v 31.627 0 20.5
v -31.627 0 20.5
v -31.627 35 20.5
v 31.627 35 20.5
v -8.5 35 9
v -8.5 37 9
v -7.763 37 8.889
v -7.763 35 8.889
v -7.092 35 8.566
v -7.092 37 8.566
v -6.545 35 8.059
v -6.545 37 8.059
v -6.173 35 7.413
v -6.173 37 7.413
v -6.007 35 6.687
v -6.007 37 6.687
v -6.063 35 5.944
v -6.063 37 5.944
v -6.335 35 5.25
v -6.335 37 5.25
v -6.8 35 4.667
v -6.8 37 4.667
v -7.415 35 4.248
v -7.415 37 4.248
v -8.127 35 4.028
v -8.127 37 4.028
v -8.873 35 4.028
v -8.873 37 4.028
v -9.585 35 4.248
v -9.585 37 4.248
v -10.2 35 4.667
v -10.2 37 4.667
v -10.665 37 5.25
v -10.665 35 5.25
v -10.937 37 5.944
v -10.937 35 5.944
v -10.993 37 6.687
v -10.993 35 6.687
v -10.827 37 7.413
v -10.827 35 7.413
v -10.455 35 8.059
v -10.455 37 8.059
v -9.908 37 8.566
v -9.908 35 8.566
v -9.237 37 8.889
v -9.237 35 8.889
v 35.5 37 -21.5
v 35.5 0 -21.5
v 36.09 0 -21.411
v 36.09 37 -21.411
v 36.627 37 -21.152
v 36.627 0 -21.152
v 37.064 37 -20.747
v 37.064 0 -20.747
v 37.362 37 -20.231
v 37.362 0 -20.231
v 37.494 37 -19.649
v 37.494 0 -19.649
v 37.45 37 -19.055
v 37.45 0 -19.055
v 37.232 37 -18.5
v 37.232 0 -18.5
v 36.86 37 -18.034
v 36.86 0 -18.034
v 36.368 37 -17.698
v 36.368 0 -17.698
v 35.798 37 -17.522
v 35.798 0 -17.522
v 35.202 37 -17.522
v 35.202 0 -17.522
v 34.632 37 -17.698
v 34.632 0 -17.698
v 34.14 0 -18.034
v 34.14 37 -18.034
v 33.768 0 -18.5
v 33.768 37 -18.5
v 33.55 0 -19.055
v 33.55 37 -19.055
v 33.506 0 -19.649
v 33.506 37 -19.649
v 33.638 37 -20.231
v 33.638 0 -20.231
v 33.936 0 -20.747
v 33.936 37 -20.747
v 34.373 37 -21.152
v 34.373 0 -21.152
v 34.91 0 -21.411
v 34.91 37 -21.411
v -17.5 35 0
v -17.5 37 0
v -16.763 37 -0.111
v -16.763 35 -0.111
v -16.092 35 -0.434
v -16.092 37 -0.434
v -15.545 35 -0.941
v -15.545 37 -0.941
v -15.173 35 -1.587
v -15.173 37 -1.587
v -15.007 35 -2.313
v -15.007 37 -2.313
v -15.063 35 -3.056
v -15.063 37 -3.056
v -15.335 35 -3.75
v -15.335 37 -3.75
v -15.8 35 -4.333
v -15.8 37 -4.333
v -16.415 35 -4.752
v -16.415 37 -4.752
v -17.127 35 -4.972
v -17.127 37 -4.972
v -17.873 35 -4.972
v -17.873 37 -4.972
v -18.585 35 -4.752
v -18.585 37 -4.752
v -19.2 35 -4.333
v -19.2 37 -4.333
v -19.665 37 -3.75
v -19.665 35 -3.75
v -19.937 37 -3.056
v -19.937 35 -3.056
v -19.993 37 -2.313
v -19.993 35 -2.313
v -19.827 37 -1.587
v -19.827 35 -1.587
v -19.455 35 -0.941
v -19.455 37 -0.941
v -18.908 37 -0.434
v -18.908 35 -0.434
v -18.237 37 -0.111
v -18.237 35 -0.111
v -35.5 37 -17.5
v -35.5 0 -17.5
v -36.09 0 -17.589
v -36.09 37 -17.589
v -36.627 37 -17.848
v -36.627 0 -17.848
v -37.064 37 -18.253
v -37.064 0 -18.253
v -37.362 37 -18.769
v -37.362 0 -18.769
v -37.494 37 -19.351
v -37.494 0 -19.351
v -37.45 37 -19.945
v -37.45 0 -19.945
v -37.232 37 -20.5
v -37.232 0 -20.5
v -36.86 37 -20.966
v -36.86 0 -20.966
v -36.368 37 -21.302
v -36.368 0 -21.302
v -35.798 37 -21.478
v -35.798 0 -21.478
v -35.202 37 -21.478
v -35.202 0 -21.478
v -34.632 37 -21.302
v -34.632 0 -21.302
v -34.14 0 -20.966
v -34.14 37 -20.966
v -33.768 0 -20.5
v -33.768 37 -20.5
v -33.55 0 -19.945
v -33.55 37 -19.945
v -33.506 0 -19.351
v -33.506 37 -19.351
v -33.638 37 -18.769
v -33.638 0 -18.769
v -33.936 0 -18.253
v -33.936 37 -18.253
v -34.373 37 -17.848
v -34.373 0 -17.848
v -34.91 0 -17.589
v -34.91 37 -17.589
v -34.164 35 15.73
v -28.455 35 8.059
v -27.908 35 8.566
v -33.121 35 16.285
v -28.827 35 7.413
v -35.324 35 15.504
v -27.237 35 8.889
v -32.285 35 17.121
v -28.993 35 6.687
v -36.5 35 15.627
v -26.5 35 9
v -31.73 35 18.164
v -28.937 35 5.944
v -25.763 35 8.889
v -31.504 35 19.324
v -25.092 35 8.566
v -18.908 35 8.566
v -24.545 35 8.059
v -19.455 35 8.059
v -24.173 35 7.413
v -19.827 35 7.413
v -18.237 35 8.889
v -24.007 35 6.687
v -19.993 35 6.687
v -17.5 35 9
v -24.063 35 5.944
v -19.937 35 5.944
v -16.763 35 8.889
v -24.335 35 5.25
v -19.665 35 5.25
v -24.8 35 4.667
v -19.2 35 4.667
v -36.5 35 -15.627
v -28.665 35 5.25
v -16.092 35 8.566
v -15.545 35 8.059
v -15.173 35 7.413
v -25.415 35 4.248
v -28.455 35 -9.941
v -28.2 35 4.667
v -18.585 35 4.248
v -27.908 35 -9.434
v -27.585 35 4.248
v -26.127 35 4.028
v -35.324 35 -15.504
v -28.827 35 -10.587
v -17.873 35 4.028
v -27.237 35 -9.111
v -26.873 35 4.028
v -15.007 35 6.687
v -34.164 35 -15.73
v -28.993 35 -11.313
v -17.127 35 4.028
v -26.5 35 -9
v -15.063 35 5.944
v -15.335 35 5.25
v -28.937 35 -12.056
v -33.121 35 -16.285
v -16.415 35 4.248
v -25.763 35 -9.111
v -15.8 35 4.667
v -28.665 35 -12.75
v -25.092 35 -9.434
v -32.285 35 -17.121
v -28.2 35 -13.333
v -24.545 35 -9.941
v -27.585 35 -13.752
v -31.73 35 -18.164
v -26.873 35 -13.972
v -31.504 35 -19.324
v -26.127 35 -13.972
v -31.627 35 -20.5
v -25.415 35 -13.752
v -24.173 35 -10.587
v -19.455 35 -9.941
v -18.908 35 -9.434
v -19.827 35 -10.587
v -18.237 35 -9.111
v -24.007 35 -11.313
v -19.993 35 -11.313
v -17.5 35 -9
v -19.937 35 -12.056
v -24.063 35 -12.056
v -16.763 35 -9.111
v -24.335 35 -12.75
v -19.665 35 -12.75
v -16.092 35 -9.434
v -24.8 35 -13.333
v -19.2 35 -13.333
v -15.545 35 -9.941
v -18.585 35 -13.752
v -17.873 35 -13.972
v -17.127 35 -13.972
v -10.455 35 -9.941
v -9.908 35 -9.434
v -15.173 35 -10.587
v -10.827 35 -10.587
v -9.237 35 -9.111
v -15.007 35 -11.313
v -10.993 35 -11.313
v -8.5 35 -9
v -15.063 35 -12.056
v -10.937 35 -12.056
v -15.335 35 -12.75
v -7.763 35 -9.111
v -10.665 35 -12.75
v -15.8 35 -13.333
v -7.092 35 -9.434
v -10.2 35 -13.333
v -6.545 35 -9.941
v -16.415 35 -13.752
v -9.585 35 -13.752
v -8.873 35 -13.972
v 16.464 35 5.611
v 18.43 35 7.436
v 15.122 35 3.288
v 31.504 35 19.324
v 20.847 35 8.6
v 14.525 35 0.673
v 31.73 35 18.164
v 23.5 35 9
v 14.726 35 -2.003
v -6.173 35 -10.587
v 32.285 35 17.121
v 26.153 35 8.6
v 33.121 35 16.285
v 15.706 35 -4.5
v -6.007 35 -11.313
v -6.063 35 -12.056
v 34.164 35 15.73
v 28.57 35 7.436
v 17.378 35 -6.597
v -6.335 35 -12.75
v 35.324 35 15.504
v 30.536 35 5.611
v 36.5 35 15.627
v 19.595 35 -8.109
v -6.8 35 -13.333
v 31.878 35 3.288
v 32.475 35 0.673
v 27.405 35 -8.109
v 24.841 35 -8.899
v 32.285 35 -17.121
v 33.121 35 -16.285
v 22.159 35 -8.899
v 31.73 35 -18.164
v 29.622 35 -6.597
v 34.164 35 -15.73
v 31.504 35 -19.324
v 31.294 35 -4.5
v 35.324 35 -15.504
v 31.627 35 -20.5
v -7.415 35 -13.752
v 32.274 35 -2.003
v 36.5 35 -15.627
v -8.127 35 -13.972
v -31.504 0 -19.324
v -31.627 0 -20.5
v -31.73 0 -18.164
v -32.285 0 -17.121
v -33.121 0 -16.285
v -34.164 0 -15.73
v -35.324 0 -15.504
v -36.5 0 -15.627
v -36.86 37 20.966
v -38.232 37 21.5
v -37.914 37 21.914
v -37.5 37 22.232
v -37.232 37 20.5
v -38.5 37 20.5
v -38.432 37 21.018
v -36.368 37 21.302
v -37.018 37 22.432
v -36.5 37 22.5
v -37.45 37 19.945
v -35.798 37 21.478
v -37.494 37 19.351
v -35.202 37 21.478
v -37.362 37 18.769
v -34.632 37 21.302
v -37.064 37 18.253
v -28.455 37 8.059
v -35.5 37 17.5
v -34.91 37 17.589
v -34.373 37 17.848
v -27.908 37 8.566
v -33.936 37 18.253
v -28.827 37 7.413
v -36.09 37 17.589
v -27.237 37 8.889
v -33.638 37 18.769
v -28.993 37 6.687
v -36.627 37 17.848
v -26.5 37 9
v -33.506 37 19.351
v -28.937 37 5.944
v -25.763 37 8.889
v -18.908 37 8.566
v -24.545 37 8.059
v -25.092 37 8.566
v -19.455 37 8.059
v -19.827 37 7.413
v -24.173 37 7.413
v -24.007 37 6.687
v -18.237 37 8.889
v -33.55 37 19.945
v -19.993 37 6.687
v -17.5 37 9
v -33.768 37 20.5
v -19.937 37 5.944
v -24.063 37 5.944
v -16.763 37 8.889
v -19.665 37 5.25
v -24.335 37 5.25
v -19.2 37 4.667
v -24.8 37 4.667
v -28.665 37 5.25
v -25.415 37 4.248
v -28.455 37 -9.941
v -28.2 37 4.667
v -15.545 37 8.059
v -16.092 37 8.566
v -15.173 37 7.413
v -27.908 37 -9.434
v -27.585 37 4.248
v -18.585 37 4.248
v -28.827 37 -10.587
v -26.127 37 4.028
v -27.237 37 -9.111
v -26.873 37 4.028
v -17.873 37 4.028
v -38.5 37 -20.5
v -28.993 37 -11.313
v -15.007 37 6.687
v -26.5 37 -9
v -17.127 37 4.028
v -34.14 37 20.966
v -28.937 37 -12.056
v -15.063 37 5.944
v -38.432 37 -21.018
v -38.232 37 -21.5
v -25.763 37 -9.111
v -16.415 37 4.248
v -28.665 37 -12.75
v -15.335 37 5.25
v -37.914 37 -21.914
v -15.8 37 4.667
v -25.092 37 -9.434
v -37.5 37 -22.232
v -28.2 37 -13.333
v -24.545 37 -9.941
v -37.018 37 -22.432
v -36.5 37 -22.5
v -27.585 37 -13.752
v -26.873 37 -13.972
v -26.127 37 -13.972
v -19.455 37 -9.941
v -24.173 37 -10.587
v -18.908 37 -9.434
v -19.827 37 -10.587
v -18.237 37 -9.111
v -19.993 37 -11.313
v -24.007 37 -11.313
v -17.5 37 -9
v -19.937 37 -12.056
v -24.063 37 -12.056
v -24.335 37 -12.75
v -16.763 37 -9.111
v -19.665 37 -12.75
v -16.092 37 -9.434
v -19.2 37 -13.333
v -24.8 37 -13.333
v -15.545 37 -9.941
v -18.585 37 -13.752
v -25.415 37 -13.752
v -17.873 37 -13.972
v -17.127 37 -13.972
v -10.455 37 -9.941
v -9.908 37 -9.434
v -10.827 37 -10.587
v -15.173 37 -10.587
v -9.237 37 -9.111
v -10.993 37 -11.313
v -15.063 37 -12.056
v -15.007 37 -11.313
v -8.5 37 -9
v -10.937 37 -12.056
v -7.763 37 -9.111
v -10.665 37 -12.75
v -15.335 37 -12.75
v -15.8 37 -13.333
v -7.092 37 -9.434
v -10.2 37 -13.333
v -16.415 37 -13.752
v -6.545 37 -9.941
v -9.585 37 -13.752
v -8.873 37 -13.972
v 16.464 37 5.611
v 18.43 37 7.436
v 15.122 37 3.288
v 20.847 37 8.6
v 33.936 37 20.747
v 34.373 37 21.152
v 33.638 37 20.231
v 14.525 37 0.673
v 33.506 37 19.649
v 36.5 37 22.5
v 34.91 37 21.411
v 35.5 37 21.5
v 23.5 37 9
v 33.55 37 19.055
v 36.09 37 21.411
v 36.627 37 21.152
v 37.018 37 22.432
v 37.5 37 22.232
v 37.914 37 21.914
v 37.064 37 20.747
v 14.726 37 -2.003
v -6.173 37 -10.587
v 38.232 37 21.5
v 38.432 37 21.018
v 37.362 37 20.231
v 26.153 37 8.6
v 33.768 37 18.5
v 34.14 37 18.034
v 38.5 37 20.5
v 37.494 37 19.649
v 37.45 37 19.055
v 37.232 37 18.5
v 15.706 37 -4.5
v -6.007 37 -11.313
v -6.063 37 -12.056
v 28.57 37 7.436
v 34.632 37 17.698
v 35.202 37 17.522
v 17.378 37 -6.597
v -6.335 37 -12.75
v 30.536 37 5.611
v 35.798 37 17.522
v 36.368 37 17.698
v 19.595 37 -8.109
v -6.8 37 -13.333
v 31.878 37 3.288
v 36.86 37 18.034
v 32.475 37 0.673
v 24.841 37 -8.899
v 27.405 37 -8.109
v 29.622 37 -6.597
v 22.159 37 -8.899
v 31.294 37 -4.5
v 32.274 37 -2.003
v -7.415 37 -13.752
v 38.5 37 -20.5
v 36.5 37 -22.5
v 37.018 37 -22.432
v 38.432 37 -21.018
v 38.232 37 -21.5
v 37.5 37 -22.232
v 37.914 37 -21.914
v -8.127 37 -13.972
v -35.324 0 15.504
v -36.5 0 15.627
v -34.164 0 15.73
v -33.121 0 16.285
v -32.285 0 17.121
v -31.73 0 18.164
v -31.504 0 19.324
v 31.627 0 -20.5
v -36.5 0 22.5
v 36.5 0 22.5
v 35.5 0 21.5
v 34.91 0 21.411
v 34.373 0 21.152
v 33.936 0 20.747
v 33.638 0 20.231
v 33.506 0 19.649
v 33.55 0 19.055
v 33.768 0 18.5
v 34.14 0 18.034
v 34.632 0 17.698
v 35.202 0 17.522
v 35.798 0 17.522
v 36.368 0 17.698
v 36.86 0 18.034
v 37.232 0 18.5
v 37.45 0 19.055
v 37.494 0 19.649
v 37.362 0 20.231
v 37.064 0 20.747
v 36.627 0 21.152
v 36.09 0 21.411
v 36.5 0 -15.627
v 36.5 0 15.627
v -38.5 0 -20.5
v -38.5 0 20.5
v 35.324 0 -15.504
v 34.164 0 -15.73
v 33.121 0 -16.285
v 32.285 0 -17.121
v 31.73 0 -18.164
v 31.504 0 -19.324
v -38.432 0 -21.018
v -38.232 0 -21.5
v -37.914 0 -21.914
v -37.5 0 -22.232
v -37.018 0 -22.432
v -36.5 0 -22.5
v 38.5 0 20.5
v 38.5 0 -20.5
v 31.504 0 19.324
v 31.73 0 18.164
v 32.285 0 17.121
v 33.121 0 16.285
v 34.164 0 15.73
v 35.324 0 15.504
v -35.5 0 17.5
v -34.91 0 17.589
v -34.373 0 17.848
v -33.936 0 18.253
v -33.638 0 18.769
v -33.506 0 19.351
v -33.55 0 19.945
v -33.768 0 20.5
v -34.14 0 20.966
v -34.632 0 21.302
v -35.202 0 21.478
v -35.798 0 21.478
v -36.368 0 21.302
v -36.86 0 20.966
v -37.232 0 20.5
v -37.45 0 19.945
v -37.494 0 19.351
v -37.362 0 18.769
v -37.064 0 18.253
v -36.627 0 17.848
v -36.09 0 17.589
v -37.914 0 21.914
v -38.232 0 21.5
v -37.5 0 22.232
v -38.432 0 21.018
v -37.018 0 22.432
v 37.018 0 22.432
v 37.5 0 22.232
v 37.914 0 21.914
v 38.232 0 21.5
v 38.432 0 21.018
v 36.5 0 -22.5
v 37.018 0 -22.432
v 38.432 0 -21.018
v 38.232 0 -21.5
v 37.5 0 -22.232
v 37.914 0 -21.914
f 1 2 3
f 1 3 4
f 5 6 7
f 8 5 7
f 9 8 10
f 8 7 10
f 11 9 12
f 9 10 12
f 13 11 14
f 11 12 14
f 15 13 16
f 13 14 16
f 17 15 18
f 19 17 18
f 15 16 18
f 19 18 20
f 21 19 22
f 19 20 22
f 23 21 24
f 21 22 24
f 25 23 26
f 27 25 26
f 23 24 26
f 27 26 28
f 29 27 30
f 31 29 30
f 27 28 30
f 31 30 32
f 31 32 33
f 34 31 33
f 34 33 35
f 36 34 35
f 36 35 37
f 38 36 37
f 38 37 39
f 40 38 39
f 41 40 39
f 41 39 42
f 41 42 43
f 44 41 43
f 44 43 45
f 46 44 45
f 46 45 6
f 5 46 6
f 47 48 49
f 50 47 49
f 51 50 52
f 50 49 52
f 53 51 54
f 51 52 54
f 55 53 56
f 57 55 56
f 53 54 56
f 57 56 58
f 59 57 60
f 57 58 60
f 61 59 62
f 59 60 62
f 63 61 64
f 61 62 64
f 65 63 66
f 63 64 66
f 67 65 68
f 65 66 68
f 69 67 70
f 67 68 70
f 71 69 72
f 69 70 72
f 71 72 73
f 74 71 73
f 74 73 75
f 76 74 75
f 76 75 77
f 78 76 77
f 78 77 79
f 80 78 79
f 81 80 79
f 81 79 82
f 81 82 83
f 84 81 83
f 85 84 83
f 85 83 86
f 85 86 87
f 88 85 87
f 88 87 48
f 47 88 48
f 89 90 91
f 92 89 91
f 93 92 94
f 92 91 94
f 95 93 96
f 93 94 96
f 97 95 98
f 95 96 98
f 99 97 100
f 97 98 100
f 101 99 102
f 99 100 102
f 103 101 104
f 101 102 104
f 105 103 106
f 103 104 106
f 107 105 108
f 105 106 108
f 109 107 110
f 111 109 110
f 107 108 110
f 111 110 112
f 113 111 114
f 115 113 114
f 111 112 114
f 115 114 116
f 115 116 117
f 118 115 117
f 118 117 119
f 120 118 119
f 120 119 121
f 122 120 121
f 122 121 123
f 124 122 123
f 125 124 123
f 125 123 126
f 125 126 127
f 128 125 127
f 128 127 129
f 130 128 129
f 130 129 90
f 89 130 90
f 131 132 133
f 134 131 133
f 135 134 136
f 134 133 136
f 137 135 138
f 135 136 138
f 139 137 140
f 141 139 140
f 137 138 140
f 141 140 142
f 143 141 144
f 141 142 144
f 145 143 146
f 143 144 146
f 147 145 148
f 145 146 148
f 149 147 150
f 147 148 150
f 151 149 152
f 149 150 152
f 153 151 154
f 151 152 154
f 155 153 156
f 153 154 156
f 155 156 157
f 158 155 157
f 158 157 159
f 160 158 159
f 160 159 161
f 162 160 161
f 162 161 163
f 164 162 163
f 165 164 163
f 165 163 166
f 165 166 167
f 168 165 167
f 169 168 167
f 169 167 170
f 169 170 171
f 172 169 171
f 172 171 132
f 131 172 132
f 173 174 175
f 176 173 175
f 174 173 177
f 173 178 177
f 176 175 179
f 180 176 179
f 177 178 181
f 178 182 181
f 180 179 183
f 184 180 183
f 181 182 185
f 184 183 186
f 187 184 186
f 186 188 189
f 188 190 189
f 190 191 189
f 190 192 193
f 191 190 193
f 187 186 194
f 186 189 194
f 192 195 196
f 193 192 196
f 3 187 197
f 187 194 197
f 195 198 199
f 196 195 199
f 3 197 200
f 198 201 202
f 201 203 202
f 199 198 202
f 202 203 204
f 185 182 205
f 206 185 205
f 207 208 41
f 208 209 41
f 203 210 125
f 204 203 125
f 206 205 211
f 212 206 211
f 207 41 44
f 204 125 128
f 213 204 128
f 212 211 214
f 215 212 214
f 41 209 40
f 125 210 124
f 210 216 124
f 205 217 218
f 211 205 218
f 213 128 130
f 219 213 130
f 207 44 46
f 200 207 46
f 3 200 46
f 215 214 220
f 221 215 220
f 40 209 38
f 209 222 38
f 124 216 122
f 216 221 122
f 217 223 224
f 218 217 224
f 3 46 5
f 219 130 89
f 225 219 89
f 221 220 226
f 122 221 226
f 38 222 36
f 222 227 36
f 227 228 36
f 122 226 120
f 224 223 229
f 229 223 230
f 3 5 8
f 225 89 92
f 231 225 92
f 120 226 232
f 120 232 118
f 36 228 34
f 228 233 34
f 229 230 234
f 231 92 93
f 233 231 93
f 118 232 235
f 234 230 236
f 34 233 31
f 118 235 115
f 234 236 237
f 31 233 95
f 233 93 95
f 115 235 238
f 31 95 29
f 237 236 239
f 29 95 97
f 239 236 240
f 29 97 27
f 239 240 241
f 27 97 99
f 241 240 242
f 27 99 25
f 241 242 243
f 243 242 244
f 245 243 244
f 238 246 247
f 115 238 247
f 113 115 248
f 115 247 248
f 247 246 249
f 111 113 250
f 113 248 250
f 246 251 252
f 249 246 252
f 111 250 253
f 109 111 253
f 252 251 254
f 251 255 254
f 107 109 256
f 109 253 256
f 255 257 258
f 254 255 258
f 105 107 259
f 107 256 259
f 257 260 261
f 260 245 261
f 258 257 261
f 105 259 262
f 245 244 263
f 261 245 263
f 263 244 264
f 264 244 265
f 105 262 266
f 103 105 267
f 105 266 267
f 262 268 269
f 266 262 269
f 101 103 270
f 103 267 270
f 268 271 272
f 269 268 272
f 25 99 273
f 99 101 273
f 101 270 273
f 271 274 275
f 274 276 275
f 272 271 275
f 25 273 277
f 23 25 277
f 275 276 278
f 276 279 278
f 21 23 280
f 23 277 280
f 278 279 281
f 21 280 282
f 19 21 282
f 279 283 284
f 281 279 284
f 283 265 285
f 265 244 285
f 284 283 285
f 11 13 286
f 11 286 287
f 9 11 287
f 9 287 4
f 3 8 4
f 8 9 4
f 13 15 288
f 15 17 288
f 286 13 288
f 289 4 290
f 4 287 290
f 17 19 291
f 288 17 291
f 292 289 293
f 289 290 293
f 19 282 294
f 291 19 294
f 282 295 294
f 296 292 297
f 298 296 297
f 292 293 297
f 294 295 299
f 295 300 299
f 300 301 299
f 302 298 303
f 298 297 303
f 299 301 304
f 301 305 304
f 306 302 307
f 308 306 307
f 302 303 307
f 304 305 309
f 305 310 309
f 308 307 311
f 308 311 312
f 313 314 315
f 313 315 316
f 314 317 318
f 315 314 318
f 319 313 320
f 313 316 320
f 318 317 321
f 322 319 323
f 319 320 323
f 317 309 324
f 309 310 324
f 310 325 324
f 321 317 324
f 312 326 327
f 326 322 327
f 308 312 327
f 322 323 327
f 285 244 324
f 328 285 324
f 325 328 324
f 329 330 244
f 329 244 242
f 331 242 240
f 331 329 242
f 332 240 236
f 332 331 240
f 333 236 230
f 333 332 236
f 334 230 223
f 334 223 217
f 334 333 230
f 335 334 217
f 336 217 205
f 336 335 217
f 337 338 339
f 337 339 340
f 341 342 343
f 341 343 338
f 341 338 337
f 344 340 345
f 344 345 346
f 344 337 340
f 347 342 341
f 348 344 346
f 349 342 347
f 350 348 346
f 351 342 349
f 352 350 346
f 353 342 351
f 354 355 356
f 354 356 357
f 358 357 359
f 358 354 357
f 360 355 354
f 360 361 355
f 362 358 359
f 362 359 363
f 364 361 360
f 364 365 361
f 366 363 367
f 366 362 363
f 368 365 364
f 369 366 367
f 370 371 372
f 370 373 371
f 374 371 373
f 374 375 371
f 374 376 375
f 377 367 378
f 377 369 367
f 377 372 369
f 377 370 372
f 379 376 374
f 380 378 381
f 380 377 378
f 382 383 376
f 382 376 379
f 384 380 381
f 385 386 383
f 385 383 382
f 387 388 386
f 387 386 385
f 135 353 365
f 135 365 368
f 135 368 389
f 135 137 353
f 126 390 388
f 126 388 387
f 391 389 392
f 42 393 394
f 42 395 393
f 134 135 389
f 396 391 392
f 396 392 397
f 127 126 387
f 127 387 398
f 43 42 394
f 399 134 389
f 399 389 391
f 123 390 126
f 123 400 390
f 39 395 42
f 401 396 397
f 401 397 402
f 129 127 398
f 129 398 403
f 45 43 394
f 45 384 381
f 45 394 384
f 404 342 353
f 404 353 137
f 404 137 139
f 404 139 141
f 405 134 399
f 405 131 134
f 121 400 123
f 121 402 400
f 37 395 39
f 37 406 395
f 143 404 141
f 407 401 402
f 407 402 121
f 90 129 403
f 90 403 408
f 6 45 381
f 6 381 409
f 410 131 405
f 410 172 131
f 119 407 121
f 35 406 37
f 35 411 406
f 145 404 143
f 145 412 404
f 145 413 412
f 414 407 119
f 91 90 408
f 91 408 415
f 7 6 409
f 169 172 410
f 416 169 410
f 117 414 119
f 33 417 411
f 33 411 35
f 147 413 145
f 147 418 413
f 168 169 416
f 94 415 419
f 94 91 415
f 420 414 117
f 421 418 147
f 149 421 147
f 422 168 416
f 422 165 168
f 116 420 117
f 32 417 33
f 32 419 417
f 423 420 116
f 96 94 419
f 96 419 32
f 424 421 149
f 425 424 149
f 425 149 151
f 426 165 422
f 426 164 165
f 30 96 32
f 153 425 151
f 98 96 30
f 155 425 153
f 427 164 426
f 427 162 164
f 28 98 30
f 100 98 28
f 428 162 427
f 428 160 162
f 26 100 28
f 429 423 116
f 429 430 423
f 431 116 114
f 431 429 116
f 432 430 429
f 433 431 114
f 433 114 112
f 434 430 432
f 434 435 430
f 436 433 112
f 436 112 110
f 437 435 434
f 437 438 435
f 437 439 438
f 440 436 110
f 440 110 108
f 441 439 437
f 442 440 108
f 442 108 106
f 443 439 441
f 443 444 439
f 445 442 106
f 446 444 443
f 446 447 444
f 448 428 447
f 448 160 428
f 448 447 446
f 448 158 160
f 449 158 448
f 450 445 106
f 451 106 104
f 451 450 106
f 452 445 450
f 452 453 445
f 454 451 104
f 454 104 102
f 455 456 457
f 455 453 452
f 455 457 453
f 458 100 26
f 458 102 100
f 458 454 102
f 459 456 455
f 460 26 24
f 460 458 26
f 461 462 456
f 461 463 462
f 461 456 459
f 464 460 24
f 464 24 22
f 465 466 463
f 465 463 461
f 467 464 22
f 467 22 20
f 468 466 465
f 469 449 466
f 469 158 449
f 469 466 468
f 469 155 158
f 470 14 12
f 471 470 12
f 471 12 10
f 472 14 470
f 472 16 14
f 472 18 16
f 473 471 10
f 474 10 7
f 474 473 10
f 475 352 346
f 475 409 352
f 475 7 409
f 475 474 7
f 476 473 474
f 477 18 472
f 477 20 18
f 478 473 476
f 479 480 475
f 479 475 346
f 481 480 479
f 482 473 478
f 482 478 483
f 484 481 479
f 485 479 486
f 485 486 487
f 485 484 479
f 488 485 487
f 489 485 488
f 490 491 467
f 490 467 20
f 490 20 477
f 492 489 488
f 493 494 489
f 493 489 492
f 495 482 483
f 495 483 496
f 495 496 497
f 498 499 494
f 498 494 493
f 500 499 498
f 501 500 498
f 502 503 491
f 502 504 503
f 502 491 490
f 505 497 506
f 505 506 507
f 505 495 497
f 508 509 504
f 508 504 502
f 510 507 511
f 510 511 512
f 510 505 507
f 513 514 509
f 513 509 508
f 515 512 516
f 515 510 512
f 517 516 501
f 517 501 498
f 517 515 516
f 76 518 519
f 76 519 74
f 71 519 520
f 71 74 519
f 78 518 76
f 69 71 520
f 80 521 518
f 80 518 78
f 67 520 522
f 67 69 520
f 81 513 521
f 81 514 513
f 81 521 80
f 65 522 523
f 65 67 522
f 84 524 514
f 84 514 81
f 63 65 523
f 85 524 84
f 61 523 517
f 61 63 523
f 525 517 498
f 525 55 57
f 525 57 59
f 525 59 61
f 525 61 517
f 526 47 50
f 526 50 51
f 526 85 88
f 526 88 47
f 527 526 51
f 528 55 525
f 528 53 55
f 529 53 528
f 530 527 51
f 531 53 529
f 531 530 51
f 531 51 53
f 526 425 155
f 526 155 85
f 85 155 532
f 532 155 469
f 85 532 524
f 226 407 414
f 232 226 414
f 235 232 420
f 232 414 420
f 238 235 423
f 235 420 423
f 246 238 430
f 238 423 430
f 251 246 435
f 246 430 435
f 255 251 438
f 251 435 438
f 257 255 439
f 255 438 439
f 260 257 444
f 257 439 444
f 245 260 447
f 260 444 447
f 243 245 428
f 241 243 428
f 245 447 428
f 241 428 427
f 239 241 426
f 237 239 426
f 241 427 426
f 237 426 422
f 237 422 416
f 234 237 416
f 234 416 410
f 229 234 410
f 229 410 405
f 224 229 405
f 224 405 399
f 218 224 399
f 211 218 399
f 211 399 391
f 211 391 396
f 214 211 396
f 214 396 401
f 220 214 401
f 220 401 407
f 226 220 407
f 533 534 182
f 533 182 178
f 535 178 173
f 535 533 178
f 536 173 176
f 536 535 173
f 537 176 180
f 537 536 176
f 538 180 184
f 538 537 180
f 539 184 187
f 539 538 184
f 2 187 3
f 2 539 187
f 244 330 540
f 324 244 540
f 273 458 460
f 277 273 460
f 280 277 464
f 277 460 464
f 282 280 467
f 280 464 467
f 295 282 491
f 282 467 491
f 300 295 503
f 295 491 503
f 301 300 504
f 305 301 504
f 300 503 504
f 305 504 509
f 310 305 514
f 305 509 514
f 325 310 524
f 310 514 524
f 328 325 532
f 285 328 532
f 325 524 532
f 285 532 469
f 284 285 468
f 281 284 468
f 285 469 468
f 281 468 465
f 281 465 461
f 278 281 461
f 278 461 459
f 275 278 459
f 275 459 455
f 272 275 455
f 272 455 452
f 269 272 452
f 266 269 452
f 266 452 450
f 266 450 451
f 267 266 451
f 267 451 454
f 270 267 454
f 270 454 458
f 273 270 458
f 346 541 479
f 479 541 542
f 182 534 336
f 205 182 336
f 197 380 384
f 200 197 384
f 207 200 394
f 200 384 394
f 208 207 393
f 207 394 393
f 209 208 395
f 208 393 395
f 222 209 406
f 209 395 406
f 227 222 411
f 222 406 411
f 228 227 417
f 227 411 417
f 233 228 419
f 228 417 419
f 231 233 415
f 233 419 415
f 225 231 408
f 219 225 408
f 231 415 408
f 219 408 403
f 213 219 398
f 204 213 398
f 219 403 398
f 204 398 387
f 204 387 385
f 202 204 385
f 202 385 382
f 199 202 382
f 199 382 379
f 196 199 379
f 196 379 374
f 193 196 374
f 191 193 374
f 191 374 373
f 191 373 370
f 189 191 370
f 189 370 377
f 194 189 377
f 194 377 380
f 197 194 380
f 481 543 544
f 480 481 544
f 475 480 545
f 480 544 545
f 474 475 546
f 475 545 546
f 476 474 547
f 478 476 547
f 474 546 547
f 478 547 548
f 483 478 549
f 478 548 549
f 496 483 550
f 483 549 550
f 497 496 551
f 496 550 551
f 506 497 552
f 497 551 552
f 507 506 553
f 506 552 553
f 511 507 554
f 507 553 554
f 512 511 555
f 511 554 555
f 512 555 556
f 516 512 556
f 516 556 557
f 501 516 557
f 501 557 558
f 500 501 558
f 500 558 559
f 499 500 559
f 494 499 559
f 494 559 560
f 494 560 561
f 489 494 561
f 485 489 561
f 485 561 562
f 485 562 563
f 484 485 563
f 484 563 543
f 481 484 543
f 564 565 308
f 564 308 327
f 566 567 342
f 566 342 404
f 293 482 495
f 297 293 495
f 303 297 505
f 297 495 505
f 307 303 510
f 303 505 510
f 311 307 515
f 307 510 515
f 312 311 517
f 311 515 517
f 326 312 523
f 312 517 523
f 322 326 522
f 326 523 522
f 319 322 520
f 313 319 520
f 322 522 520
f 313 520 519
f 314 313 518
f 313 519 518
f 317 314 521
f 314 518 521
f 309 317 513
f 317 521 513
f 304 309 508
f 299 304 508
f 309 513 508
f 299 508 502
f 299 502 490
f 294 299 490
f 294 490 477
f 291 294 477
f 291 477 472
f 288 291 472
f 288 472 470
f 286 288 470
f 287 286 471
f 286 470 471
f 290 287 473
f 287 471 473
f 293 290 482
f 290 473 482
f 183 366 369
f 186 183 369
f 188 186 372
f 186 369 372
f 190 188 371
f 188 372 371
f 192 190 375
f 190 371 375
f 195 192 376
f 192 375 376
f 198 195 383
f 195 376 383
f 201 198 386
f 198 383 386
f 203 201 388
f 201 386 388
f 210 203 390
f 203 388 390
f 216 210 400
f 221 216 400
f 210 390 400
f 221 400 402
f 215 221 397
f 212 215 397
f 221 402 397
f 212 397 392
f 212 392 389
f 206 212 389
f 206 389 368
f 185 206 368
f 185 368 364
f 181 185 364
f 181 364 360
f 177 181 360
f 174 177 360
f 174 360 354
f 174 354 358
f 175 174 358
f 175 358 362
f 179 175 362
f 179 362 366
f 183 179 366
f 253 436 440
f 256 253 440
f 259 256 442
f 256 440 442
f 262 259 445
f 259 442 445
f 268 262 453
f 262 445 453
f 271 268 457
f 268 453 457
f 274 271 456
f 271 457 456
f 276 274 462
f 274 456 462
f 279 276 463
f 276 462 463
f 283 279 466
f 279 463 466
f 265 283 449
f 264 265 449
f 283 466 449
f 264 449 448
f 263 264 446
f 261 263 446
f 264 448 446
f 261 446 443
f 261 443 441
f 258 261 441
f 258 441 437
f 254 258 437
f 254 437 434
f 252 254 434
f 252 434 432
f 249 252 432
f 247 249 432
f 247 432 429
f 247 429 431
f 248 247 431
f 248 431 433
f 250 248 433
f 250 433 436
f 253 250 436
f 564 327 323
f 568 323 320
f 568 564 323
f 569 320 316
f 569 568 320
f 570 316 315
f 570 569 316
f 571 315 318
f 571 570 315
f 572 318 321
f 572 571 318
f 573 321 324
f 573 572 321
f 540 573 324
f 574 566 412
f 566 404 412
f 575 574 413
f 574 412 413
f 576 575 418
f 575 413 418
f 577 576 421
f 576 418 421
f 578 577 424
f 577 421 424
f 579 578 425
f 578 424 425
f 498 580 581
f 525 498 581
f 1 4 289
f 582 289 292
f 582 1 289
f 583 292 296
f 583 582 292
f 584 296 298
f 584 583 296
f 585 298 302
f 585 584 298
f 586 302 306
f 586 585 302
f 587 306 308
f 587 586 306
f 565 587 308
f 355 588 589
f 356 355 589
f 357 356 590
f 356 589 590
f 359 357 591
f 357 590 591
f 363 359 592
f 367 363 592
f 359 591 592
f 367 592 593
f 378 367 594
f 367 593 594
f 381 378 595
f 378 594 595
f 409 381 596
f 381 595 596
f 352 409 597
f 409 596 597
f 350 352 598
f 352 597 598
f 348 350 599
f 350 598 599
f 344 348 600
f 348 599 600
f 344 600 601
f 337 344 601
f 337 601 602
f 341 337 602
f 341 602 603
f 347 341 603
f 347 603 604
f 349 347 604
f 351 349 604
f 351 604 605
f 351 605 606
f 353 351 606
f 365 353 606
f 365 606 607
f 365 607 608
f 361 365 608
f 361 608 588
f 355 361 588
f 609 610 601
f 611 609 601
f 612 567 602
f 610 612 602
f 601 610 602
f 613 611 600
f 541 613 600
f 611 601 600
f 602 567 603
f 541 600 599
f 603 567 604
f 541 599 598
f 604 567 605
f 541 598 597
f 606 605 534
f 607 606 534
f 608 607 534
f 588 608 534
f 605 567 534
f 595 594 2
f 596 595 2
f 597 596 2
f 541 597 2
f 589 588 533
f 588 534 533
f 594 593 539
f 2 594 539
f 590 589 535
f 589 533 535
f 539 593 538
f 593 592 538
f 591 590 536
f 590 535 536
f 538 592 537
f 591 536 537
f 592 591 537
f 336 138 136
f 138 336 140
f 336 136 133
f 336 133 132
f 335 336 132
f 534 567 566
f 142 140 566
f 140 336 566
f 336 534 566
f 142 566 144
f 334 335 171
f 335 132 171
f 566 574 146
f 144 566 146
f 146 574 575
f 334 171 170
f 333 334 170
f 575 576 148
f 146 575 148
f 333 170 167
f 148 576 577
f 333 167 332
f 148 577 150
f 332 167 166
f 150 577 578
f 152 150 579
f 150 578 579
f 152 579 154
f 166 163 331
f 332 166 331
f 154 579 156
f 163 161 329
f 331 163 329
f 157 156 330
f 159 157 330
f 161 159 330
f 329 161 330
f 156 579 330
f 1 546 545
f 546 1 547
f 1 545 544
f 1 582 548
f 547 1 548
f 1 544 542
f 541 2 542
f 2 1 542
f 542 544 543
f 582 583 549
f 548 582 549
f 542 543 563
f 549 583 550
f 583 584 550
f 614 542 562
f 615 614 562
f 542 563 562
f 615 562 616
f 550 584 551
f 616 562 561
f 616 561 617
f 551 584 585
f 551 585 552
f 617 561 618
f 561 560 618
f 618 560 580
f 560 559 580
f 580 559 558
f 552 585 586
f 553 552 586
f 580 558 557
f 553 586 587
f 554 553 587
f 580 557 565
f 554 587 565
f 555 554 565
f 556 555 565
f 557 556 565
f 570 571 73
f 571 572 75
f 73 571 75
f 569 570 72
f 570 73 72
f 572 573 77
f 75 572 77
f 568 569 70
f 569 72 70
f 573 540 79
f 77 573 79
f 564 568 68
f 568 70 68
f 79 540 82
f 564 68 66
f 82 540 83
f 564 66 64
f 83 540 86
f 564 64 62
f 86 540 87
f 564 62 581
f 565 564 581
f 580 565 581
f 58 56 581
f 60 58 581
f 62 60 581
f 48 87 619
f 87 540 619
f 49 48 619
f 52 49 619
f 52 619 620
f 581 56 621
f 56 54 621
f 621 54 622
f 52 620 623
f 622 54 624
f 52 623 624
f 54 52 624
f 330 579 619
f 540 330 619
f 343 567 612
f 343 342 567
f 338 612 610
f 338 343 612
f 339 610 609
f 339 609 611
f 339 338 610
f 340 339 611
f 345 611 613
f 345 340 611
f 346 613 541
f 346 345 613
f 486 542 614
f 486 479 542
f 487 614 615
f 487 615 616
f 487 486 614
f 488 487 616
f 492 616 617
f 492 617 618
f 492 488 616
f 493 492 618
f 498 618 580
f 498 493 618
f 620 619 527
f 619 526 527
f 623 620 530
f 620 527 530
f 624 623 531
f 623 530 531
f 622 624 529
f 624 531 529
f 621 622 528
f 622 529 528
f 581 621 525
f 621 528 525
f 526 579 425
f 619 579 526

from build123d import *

# Parameters (mm, degrees)
SKETCH2_W            = 77
SKETCH2_H            = 45
BOSS_EXTRUDE1_DEPTH  = 37
SKETCH24_R           = 2
CUT_EXTRUDE13_DEPTH  = 58.943938423
SHELL2_T             = -2
SKETCH5_R            = 2.5
CUT_EXTRUDE1_DEPTH   = 58.943938423
LPATTERN1_COUNT      = 3
LPATTERN1_PITCH      = 9
LPATTERN2_COUNT      = 3
LPATTERN2_PITCH      = 9
LPATTERN2_COUNT_DIR2 = 3
LPATTERN2_PITCH_DIR2 = 9
SKETCH19_R           = 9
CUT_EXTRUDE11_DEPTH  = 2
FILLET1_R            = 2


with BuildPart() as part:
    # Sketch2 → Boss-Extrude1 (new body)
    with BuildSketch(Plane(origin=(0, 0, 0), x_dir=(1, 0, 0), z_dir=(0, 1, 0))):
        Rectangle(SKETCH2_W, SKETCH2_H)
    extrude(amount=BOSS_EXTRUDE1_DEPTH)

    # Sketch24 → Cut-Extrude13 (cut, through all)
    with BuildSketch(Plane.XZ):
        with Locations(Location((-35.5, 19.5, 0), (0, 0, 270))):
            Circle(SKETCH24_R)
        with Locations(Location((35.5, 19.5, 0), (0, 0, 90))):
            Circle(SKETCH24_R)
        with Locations(Location((35.5, -19.5, 0), (0, 0, 270))):
            Circle(SKETCH24_R)
        with Locations(Location((-35.5, -19.5, 0), (0, 0, 90))):
            Circle(SKETCH24_R)
    extrude(amount=-CUT_EXTRUDE13_DEPTH, mode=Mode.SUBTRACT)

    # Shell2
    shell2_openings = [part.faces().sort_by_distance(p)[0] for p in [
        (0, 0, 0),
    ]]
    offset(amount=SHELL2_T, openings=shell2_openings)

    # Sketch5 → Cut-Extrude1 (cut, through all)
    with BuildSketch(Plane(origin=(0, 37, 0), x_dir=(1, 0, 0), z_dir=(0, 1, 0))):
        with Locations(Location((-26.5, 11.5, 0), (0, 0, 270))):
            Circle(SKETCH5_R)
    cut_extrude1 = extrude(amount=-CUT_EXTRUDE1_DEPTH, mode=Mode.SUBTRACT)

    # LPattern1: Cut-Extrude1 ×3
    with Locations(*[(i * LPATTERN1_PITCH, 0, 0) for i in range(1, LPATTERN1_COUNT)]):
        add(cut_extrude1, mode=Mode.SUBTRACT)

    # LPattern2: Cut-Extrude1 3 × 3, 2 skipped
    with Locations(*[(j * LPATTERN2_PITCH_DIR2, 0, i * LPATTERN2_PITCH) for i in range(LPATTERN2_COUNT) for j in range(LPATTERN2_COUNT_DIR2) if (i, j) not in ((0, 0), (1, 0), (1, 2))]):
        add(cut_extrude1, mode=Mode.SUBTRACT)

    # Sketch19 → Cut-Extrude11 (cut)
    with BuildSketch(Plane(origin=(0, 37, 0), x_dir=(1, 0, 0), z_dir=(0, 1, 0))):
        with Locations(Location((23.5, 0, 0), (0, 0, 270))):
            Circle(SKETCH19_R)
    extrude(amount=-CUT_EXTRUDE11_DEPTH, mode=Mode.SUBTRACT)

    # Fillet1
    fillet1_edges = [part.edges().sort_by_distance(p)[0] for p in [
        (38.5, 18.5, 22.5),
        (-38.5, 18.5, 22.5),
        (-38.5, 18.5, -22.5),
        (38.5, 18.5, -22.5),
    ]]
    fillet(fillet1_edges, radius=FILLET1_R)


solid = part.part
